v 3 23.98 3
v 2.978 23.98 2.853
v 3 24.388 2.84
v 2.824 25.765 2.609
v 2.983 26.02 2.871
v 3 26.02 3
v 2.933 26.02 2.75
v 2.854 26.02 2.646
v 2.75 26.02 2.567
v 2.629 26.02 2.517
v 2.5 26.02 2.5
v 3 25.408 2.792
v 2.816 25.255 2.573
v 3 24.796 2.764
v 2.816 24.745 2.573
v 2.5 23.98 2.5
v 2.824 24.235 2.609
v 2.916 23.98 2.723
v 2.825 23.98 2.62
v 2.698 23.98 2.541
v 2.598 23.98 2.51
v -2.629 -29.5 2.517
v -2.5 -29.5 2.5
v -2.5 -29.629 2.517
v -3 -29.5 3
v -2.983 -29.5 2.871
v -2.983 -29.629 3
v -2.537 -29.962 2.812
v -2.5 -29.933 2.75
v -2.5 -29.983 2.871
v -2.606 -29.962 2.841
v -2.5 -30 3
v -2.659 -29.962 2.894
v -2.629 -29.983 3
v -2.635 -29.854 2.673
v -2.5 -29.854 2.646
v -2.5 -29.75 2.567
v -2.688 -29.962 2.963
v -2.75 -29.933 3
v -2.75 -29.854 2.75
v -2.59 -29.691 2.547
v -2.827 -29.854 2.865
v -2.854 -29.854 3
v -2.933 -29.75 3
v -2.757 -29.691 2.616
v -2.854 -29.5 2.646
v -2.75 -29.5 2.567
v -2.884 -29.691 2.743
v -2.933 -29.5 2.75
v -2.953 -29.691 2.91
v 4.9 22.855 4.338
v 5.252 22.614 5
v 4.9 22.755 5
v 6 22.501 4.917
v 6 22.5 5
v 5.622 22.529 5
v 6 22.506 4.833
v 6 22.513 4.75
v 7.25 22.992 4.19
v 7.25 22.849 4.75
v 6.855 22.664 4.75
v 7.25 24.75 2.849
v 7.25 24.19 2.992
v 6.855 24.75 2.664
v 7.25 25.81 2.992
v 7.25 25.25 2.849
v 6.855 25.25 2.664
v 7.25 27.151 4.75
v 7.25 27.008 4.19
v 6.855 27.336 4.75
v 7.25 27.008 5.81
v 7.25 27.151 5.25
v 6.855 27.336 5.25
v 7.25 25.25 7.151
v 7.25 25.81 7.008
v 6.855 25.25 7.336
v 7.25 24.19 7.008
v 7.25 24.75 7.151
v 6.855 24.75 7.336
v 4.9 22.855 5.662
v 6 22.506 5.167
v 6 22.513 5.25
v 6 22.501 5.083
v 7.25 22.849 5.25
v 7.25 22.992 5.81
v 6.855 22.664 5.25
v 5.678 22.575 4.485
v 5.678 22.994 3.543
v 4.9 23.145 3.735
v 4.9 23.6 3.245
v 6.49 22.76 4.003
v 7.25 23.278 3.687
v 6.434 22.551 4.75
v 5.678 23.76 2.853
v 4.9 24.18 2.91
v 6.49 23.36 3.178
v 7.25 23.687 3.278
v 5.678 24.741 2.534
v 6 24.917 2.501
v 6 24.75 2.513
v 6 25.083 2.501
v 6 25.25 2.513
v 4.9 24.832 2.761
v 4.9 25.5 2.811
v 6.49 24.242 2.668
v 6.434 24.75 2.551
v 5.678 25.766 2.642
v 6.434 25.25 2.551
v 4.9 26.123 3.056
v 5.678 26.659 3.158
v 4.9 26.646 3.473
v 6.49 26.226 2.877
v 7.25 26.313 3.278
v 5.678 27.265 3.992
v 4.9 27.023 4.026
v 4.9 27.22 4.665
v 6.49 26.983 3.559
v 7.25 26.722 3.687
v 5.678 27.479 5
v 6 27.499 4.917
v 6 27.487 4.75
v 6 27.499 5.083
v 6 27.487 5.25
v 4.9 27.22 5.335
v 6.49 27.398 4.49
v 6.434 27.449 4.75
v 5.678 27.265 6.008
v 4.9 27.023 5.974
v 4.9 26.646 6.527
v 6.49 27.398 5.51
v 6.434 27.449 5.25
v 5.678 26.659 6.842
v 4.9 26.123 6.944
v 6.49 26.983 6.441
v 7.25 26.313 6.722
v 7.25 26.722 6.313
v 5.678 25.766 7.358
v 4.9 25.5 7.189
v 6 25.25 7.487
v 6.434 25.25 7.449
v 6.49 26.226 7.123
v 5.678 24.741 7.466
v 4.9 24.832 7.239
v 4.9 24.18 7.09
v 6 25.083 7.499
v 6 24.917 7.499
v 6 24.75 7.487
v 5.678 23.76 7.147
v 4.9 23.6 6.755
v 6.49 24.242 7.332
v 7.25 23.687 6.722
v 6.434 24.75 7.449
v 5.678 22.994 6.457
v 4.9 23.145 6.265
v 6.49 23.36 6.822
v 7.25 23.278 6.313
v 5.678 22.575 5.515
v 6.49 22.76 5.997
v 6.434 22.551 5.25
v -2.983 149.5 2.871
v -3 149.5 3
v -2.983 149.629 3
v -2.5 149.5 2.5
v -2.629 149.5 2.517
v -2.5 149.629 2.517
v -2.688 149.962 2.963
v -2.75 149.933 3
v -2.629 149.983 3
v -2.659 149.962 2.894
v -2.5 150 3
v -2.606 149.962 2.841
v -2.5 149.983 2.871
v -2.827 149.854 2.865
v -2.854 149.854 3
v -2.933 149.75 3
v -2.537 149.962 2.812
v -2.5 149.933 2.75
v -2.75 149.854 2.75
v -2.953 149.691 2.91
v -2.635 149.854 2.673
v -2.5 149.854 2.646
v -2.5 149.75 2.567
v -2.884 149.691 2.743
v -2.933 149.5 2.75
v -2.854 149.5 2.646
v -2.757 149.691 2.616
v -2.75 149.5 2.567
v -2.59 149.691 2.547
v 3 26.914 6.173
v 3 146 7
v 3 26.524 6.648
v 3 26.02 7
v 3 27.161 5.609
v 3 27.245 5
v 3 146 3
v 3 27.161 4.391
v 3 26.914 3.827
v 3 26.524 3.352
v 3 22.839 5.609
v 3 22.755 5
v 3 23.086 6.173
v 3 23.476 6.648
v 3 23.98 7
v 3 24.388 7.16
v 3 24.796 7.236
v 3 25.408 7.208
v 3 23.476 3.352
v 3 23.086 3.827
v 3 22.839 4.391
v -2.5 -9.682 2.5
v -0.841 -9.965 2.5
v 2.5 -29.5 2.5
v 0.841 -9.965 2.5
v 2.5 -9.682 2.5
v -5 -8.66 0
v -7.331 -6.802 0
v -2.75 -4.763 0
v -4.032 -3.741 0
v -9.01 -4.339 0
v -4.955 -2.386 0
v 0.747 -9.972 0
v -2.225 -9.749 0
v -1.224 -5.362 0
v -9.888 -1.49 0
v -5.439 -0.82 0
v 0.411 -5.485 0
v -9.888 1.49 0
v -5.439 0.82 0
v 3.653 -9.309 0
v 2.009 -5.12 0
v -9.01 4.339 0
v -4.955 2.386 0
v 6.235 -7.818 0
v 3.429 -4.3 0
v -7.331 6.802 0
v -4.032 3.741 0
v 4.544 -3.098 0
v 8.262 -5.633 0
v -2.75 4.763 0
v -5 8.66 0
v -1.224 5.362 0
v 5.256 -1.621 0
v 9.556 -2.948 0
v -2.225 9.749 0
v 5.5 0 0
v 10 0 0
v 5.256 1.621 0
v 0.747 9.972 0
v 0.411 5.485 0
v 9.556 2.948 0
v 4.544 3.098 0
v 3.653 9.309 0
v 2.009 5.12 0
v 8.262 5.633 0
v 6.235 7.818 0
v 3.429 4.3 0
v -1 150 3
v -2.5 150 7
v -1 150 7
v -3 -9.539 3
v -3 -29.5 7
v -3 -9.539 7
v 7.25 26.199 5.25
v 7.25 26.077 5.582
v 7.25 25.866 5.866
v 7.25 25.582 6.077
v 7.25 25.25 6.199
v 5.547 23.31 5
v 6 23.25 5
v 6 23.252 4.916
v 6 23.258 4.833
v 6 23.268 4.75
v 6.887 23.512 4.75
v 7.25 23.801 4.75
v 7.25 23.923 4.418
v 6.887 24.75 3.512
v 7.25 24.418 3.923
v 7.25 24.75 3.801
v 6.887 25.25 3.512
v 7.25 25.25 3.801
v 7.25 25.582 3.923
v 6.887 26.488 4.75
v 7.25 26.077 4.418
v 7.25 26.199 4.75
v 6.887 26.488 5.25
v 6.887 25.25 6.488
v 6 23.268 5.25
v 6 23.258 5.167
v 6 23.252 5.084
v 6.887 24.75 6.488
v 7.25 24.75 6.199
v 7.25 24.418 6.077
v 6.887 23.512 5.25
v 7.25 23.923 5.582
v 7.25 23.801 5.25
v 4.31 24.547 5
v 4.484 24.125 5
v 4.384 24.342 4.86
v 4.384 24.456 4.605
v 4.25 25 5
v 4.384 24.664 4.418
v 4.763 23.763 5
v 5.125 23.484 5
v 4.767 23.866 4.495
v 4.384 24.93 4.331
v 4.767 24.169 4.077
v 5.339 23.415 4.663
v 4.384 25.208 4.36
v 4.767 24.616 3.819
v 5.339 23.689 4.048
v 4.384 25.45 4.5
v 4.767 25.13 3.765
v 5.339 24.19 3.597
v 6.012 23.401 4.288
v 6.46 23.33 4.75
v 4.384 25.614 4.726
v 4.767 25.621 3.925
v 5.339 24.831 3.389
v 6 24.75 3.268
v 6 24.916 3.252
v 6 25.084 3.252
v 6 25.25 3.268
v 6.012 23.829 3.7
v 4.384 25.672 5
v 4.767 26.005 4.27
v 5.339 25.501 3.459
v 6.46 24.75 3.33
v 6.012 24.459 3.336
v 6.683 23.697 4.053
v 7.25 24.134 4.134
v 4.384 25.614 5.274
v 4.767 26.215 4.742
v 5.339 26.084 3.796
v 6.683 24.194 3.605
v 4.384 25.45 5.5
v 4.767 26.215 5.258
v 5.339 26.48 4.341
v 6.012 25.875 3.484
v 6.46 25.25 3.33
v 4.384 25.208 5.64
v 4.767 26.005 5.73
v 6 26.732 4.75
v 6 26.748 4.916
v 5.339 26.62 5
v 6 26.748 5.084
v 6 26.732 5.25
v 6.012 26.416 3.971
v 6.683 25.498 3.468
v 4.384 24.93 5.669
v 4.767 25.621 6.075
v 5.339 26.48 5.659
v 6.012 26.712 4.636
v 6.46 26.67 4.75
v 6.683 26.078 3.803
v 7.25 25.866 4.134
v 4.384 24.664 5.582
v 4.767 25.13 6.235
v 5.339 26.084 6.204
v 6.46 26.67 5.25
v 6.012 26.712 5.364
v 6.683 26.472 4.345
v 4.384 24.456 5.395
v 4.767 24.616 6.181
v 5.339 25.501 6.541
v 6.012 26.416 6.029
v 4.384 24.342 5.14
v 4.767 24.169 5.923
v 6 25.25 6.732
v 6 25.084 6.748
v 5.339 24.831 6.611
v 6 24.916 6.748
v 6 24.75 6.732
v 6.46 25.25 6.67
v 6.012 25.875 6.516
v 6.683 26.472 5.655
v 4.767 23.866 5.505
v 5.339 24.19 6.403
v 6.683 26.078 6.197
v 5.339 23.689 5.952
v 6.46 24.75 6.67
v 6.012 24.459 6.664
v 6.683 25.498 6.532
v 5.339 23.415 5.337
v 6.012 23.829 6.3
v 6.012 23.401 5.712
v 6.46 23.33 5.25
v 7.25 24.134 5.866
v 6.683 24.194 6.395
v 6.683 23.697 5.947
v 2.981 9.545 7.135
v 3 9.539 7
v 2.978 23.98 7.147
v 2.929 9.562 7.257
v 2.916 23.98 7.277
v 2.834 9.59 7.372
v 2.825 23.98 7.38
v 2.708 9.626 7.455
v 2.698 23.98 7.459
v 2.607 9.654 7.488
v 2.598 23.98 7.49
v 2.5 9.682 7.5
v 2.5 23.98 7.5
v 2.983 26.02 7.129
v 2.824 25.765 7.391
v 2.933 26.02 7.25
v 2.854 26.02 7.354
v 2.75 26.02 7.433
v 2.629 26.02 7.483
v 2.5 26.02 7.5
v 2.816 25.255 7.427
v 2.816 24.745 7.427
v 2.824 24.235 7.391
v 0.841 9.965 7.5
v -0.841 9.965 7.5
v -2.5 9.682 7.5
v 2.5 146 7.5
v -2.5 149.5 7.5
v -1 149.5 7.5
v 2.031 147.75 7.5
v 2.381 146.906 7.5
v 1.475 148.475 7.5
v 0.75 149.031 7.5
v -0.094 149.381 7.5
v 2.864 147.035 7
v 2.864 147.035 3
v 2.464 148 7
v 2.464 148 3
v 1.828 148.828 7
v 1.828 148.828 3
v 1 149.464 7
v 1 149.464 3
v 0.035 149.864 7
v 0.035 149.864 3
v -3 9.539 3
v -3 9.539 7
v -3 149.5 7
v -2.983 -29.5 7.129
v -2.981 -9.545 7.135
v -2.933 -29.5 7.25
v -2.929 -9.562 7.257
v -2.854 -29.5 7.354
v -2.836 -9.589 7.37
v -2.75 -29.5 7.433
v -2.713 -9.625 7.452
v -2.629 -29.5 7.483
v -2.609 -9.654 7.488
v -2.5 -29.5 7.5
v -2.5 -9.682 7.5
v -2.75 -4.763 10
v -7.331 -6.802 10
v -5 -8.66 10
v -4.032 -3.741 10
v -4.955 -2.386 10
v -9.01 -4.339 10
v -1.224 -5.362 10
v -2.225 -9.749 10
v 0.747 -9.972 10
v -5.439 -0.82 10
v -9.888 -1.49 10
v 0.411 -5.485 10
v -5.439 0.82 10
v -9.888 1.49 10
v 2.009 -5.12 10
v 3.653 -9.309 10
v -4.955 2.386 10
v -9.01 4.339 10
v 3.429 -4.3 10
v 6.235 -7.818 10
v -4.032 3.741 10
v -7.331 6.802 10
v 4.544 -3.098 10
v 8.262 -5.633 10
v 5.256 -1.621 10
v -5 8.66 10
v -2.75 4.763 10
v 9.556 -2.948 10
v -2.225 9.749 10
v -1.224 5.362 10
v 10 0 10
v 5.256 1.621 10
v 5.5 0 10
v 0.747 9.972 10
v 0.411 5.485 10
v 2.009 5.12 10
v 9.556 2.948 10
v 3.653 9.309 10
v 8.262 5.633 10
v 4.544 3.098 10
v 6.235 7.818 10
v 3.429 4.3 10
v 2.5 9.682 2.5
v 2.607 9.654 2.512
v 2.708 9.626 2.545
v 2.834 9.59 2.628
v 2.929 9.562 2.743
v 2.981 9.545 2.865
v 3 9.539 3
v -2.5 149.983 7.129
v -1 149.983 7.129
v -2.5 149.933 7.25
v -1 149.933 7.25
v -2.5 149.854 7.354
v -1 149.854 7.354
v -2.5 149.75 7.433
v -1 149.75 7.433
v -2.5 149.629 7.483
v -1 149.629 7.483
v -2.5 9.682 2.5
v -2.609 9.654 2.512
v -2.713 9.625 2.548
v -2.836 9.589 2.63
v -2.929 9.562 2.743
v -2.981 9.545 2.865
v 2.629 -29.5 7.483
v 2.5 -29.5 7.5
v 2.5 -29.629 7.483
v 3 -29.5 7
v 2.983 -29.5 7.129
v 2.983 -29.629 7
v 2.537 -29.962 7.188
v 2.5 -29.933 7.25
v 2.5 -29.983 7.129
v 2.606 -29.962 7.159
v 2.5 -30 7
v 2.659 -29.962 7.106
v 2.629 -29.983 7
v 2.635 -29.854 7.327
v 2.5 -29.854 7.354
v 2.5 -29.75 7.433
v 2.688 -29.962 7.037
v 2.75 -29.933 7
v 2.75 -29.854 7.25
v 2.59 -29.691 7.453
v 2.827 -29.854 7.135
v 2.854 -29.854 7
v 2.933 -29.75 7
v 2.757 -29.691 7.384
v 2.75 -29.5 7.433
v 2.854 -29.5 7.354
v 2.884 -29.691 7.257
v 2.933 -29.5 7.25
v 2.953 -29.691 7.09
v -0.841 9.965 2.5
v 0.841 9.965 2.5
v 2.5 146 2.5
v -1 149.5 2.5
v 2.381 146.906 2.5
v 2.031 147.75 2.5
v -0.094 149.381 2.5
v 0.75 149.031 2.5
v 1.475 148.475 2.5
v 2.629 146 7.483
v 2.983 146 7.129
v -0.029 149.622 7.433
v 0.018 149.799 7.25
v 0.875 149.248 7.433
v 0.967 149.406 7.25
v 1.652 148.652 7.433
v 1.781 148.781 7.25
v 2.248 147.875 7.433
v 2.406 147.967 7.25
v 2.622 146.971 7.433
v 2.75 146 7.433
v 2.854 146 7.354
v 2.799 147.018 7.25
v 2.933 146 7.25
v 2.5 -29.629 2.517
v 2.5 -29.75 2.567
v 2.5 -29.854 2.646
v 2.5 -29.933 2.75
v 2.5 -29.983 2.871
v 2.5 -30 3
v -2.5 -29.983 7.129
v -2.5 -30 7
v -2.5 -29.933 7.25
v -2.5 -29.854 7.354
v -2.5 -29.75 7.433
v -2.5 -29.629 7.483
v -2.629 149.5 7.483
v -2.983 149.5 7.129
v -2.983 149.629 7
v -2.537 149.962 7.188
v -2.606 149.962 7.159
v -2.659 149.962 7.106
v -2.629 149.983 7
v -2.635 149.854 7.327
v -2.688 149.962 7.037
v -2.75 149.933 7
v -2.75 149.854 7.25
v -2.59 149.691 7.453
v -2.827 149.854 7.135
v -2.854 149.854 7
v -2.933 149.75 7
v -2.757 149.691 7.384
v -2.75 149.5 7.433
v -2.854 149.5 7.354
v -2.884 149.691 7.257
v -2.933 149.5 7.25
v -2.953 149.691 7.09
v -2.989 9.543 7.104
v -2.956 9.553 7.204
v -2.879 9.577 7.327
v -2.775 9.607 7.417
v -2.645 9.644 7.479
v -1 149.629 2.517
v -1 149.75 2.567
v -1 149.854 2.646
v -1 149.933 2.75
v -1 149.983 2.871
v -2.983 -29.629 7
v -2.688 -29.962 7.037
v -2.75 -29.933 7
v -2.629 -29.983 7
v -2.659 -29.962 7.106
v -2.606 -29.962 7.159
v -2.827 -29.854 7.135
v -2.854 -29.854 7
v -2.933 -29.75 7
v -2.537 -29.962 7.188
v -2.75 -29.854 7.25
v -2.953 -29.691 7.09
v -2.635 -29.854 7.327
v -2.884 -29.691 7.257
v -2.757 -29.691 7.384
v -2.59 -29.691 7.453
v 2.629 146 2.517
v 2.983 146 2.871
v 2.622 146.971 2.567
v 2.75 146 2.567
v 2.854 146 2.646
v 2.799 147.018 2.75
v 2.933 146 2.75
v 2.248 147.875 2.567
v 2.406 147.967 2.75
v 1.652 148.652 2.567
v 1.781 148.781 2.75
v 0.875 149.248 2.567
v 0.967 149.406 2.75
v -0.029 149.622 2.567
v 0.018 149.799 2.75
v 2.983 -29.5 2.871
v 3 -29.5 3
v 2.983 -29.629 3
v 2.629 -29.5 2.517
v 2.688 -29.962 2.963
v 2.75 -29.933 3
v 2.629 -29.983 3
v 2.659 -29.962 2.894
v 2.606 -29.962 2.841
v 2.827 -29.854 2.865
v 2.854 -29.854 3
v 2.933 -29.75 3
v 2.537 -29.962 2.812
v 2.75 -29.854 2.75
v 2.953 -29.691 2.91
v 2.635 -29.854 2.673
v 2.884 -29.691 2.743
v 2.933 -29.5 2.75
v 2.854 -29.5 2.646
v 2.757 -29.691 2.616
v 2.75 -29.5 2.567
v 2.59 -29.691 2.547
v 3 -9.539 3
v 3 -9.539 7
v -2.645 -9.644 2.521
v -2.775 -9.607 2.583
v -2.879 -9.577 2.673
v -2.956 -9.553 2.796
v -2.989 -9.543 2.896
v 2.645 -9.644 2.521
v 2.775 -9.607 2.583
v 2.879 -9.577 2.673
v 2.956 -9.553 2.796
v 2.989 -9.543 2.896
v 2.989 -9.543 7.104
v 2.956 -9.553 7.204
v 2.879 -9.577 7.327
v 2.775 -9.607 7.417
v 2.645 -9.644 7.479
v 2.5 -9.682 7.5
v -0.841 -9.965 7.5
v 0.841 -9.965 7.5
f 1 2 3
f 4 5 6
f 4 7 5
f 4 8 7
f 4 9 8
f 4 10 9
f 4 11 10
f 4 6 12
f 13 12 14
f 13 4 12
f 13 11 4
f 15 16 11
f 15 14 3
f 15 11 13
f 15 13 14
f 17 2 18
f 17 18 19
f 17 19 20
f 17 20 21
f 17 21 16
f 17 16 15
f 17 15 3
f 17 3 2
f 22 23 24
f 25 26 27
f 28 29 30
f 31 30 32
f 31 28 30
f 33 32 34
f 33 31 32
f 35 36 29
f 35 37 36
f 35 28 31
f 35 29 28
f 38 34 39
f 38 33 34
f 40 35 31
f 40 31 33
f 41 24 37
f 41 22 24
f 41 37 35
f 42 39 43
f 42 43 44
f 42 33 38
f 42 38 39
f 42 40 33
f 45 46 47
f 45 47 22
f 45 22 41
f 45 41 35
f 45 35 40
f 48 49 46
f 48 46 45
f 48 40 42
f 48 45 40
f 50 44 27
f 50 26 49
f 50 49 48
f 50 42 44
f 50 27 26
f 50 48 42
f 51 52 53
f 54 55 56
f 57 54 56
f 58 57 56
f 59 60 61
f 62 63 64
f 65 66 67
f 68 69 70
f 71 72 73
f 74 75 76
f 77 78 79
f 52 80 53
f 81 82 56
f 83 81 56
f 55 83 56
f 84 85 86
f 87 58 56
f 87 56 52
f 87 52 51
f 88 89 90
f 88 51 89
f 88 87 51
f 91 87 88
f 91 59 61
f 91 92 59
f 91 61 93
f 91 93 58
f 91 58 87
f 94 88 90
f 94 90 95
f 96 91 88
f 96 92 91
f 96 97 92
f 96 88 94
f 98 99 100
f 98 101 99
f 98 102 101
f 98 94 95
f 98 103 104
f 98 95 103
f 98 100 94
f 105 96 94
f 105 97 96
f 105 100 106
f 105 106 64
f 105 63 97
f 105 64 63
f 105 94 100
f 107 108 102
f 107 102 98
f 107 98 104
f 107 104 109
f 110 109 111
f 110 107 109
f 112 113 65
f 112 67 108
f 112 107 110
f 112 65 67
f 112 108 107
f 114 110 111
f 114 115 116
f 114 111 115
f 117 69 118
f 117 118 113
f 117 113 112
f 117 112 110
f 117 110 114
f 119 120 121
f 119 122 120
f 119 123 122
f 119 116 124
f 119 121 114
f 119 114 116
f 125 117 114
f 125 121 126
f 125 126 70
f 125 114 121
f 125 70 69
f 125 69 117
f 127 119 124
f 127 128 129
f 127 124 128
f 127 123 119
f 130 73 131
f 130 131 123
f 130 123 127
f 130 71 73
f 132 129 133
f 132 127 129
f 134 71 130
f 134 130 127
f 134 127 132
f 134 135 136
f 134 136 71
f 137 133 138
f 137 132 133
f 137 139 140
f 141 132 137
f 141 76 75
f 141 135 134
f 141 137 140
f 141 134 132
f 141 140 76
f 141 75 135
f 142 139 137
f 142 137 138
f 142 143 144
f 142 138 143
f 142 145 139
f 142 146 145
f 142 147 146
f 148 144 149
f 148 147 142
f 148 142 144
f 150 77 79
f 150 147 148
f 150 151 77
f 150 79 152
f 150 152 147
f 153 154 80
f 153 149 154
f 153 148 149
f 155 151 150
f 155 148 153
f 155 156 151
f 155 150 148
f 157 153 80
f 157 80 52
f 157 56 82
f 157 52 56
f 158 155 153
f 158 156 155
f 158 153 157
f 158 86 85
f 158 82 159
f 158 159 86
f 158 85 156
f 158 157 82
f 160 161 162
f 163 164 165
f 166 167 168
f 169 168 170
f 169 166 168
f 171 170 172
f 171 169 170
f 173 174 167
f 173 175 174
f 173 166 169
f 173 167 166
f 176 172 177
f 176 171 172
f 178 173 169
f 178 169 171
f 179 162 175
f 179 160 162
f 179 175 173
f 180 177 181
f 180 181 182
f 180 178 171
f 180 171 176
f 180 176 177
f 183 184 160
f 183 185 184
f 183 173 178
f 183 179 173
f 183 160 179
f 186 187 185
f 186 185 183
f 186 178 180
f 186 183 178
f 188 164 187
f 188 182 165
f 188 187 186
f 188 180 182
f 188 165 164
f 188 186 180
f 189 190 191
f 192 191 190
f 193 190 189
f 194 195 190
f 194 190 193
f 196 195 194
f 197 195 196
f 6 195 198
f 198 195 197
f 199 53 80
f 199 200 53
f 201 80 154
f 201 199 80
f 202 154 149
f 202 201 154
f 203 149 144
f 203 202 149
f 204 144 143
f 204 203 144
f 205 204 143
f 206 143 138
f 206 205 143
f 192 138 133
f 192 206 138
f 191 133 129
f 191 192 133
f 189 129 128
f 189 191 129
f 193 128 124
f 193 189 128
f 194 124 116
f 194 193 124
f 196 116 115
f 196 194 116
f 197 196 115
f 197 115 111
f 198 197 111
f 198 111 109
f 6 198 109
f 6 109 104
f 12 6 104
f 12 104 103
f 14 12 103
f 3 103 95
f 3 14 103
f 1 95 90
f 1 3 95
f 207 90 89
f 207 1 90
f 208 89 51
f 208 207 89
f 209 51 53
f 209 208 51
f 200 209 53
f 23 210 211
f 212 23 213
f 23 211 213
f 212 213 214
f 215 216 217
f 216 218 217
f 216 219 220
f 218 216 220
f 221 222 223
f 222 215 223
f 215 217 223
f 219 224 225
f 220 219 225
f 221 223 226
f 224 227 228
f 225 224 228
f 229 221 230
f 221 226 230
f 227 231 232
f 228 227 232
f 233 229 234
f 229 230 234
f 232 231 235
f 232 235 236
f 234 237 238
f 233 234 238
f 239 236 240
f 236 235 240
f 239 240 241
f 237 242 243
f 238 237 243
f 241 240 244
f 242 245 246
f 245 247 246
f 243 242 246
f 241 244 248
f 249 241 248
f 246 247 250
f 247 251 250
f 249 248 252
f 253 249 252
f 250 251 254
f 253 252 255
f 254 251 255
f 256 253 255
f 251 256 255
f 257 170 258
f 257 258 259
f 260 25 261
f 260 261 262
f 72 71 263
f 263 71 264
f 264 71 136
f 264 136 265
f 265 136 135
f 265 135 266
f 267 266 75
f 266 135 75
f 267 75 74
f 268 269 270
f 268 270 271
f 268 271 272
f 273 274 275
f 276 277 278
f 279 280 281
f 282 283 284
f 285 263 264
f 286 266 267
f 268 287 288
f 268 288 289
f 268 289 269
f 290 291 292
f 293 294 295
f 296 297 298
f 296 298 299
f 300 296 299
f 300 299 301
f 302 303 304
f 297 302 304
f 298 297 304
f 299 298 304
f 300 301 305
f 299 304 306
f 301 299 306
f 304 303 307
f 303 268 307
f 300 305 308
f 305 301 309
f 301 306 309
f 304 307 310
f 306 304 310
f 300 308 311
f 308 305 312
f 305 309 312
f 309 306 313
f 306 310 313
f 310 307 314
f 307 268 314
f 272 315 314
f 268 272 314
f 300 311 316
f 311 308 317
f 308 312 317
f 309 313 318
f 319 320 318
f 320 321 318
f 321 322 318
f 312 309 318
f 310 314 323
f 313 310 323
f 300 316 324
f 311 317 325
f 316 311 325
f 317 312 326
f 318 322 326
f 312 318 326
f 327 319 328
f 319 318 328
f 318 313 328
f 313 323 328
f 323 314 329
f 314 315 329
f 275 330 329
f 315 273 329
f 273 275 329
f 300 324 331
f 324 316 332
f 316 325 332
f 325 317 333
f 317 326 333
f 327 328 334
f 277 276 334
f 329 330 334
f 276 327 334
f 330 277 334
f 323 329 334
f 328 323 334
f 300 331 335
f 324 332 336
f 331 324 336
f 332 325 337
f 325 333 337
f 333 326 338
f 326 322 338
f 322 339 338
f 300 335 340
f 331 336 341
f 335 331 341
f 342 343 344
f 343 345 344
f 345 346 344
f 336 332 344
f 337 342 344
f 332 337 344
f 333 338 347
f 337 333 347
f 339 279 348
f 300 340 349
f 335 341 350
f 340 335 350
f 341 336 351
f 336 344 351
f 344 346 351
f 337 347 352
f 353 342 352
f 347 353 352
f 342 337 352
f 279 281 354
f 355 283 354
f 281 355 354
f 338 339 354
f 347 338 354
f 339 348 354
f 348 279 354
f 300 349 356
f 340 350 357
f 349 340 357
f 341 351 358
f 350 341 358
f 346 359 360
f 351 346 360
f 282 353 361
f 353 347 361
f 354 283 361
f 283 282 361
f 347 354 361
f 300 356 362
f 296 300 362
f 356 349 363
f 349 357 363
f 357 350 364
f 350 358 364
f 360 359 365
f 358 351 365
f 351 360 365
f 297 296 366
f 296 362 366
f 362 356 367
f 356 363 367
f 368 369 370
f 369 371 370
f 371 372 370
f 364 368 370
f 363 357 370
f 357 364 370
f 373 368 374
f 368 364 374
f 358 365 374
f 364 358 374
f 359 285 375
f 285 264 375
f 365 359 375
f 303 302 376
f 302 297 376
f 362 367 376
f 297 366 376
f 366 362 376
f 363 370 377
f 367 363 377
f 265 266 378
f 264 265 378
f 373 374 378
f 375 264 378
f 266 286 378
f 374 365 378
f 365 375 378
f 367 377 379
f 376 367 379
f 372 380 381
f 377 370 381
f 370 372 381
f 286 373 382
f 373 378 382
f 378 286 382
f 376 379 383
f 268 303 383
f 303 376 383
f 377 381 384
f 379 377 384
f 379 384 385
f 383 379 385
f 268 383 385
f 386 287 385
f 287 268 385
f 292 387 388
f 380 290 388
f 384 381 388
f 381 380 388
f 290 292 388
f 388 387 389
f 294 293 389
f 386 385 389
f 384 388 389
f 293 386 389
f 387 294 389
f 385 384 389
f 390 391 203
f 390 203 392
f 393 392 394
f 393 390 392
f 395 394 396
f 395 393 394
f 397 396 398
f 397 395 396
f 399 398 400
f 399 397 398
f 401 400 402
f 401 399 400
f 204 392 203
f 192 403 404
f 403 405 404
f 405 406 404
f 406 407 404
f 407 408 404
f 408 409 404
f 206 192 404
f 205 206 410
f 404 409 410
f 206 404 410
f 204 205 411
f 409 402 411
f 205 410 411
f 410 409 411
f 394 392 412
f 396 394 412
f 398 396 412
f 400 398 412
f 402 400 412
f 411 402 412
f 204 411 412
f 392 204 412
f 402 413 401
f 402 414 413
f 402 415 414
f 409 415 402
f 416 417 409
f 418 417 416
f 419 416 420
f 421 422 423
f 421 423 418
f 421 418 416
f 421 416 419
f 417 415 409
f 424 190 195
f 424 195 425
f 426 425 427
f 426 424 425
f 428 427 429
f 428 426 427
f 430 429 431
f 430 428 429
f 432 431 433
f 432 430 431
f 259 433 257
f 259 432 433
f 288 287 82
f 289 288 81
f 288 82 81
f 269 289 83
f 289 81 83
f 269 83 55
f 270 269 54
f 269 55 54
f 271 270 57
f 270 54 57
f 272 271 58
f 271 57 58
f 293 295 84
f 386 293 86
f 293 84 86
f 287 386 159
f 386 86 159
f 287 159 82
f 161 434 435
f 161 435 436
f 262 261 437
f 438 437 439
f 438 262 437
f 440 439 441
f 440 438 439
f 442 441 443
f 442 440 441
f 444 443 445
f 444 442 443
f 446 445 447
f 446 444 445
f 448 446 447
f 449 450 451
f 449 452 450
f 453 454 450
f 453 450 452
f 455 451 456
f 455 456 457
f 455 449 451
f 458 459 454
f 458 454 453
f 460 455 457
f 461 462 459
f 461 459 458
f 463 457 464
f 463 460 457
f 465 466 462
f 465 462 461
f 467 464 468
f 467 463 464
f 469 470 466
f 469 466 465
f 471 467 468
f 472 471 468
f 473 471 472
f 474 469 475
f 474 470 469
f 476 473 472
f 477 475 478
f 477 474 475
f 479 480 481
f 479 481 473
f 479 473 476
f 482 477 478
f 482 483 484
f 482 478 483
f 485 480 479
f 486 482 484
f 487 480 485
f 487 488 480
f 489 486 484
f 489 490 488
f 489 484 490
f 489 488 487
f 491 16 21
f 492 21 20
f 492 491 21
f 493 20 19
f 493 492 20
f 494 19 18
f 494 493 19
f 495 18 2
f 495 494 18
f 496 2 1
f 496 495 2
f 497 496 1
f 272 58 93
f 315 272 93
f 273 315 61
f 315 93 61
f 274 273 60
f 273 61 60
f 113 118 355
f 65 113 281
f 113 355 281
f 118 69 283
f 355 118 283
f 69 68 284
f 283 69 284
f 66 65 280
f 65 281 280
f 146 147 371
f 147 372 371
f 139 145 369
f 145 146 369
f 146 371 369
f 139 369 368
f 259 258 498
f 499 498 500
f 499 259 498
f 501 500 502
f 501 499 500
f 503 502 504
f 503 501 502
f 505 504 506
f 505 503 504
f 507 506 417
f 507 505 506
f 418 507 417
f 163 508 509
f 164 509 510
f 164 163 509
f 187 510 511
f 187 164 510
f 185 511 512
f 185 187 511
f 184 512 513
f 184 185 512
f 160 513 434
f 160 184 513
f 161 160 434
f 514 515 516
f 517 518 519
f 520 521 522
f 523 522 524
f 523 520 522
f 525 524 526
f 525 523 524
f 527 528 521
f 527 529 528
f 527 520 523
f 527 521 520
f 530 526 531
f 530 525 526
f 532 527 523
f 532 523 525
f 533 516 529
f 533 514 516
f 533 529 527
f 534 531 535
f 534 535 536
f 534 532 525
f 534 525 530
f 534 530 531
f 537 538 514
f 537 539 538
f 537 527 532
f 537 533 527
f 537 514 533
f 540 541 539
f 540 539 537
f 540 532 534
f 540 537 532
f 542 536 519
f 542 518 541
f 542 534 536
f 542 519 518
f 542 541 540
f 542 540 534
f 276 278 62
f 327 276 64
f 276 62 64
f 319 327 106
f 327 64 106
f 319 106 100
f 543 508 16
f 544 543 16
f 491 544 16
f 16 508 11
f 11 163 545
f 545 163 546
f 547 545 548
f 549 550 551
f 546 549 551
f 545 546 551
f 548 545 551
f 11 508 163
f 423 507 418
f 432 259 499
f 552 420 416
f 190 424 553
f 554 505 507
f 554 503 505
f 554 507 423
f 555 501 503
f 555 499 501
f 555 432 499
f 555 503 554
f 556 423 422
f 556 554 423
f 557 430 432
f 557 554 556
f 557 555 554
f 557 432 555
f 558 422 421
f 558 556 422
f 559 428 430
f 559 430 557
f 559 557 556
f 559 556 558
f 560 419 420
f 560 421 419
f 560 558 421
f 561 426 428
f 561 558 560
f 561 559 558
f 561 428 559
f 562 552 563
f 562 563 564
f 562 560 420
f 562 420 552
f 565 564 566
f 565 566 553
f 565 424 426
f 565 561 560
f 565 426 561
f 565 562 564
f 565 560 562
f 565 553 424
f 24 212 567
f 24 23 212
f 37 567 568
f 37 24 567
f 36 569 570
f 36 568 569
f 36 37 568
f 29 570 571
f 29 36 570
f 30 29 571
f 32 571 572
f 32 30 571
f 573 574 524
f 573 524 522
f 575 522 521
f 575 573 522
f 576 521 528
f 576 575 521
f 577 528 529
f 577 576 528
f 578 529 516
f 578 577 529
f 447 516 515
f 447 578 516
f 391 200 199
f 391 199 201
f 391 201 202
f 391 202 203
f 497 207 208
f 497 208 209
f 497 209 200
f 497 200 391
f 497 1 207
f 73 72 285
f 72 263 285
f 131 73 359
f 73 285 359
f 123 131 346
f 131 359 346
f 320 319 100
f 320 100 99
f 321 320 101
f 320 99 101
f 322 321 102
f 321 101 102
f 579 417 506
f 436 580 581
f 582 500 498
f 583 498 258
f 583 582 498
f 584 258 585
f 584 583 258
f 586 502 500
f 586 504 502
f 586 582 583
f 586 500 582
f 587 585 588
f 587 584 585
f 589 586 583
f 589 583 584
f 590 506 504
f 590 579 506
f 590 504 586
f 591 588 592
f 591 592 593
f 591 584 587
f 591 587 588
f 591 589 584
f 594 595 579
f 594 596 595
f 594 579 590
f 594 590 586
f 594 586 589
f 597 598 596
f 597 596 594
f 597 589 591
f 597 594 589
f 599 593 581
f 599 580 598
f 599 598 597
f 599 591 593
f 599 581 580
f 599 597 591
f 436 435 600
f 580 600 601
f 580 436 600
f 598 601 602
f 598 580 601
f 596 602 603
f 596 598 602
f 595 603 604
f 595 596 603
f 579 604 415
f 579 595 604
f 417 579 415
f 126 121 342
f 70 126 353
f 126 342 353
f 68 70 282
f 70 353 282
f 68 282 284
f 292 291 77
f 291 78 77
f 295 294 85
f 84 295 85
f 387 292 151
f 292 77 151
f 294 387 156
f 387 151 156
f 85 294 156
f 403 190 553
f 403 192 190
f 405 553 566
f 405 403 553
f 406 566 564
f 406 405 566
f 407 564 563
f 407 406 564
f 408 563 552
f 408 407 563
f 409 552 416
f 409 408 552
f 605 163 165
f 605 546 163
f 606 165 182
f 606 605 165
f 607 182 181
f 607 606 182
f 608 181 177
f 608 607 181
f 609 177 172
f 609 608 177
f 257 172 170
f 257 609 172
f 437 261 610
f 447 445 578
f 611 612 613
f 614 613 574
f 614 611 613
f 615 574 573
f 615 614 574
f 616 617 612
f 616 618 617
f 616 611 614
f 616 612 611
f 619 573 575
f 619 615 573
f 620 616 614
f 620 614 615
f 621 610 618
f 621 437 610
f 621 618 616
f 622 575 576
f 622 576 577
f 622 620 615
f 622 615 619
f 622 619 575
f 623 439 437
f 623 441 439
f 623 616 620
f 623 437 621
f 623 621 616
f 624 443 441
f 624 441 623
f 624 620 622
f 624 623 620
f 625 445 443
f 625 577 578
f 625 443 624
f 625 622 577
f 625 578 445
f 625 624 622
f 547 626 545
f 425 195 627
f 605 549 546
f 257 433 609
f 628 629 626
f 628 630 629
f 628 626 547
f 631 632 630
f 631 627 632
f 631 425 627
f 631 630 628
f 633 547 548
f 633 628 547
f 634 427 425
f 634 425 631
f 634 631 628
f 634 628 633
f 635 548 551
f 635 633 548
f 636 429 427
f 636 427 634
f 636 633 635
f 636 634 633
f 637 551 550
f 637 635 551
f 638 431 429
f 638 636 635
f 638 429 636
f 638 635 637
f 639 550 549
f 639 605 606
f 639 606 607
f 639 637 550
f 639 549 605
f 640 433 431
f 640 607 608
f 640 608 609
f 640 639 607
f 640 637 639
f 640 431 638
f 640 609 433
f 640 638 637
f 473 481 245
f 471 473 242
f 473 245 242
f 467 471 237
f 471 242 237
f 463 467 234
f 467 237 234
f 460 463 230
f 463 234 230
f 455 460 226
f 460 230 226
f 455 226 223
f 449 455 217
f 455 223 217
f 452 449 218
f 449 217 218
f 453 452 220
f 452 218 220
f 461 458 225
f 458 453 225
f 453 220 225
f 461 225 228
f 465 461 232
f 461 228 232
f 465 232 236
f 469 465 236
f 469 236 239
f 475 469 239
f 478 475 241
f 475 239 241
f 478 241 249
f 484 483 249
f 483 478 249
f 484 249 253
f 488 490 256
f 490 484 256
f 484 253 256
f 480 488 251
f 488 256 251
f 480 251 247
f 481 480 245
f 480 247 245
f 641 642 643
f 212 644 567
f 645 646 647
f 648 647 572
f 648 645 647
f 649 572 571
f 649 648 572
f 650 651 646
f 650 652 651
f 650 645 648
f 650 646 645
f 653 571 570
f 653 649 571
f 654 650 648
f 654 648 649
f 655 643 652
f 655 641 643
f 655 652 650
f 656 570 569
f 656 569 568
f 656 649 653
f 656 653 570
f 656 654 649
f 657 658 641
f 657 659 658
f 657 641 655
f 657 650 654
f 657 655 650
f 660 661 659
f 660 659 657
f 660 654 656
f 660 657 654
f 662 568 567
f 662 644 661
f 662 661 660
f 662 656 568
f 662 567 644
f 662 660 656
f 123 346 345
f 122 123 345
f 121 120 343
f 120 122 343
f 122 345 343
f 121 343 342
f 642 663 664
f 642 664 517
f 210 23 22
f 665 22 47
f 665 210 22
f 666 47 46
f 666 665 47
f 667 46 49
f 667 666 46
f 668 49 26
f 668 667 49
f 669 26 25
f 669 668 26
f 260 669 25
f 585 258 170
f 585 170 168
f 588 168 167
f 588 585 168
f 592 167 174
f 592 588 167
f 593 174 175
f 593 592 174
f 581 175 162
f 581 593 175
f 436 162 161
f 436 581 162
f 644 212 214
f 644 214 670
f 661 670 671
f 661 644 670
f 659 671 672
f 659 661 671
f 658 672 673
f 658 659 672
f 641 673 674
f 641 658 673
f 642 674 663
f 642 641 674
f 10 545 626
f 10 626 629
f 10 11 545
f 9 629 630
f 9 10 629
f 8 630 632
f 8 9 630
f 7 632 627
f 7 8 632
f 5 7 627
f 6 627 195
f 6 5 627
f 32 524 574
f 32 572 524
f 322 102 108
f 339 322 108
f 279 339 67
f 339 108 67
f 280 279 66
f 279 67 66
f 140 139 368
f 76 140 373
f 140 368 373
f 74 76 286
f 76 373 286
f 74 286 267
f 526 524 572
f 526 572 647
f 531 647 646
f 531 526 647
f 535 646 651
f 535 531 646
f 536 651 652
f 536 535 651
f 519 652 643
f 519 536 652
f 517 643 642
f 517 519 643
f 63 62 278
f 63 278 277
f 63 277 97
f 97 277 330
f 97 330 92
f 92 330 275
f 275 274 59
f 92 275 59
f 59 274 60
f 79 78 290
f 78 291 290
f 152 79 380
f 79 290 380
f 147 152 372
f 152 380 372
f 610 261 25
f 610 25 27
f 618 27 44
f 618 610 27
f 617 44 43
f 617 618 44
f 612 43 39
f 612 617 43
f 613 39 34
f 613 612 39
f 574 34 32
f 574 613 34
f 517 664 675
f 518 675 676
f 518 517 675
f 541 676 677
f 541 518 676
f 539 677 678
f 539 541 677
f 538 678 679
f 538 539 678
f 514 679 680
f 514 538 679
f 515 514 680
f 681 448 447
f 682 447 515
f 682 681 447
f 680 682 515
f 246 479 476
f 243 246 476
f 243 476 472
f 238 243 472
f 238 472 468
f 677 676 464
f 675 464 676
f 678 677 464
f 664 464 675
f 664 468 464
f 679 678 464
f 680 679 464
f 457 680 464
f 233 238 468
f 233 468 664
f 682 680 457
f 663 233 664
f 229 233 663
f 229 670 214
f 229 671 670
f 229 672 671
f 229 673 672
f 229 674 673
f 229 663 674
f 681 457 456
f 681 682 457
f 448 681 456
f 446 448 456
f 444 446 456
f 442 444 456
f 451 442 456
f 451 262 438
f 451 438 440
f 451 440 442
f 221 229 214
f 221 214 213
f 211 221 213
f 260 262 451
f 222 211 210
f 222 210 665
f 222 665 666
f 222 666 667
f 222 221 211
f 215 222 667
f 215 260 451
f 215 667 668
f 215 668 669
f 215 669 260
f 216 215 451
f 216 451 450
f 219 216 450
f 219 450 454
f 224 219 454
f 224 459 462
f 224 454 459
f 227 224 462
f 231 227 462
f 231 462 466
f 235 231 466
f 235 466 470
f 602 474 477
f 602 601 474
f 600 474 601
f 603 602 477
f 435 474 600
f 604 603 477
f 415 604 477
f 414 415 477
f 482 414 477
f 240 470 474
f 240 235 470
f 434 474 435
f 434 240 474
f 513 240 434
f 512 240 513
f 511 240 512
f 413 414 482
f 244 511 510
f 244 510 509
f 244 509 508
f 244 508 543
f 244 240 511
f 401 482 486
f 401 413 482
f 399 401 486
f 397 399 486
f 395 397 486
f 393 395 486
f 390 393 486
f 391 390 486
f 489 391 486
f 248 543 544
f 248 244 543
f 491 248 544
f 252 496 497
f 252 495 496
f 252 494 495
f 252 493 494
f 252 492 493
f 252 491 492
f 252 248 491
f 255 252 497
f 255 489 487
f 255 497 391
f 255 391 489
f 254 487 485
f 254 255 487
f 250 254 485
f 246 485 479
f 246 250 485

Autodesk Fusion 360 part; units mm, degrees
sketch "Szkic1" plane through (0, 0, 0) normal (0, 0, 1) x (1, 0, 0)
  circle A0 centre (0, 0) radius 5.5
  line L0 (-3, 150) -> (3, 150)
  line L1 (3, 150) -> (3, -30)
  line L2 (3, -30) -> (-3, -30)
  line L3 (-3, -30) -> (-3, 150)
  line L4 (0, 1.75) -> (0, 22.5)
  circle A1 centre (0, 0) radius 10
  dimension "d7" = 11
  dimension "d8" = 30
  dimension "d10" = 6
  dimension "d11" = 180
  dimension "d12" = 20
extrude "Wyciągnięcie proste1" add sketch "Szkic1" along normal blind 10 contours A0 L1 A1 | A0 L1 L4 A1 | A0 L1 L3 A1 | A0 L3 L4 A1 | A0 L3 A1
extrude "Wyciągnięcie proste2" add sketch "Szkic1" along normal blind 5 from surface at 2.5 contours L0 L1 L3 A1 | L1 L2 L3 A1
ref_plane "Płaszczyzna konstrukcyjna1" through (0, -19.7697, 5) normal (0, 0, 1) x (1, 0, 0)
sketch "Szkic2" plane through (0, 0, 5) normal (0, 0, 1) x (1, 0, 0)
  circle A0 centre (6, 25) radius 2.5
  line L0 (4.9, 22.755) -> (3, 22.755)
  line L1 (3, 22.755) -> (3, 27.245)
  line L2 (3, 27.245) -> (4.9, 27.245)
  line L3 (4.9, 27.245) -> (4.9, 22.755)
  line L4 (3, 150) -> (3, -30)
  line L5 (6, 25) -> (3, 25)
  line L6 (7.25, 22.8349) -> (7.25, 27.1651)
  circle A1 centre (6, 25) radius 1.75
  line L7 (7.7321, 24.75) -> (6, 24.75)
  line L8 (6, 24.75) -> (6, 25.25)
  line L9 (6, 25.25) -> (7.7321, 25.25)
  line L10 (7.7321, 25.25) -> (7.7321, 24.75)
  line L11 (-3, 150) -> (3, 150)
  dimension "d18" = 5
  dimension "d19" = 1.25
  dimension "d20" = 3.5
  dimension "d21" = 0.5
  dimension "d22" = 25
  dimension "d23" = 125
  dimension "d24" = 1.1
  dimension "d25" = 3
revolve "Obrót1" add sketch "Szkic2" angle 360 about axis through (6, 25, 5) along (-1, 0, 0) contours A0 L3 L6 A1 | A0 L0 L1 L4 L5 | A0 L3 L5 A1 picked at (5.1557, 22.9188) picked at (4.6078, 23.2377)
extrude "Wyciągnięcie proste3" cut sketch "Szkic2" along normal through all and the other way through all contours L6 L7 L8 L9
pattern_circular "Szyk kołowy1" count 2 over 90 about axis through (6, 25, 5) along (-1, 0, 0) of "Wyciągnięcie proste3"
fillet "Zaokrąglenie1" radius 0.5 15 edges at (3, 79.7697, 7.5) (-3, 79.7697, 7.5) (3, 79.7697, 2.5) (-3, 79.7697, 2.5) (3, -19.7697, 7.5) (-3, -19.7697, 7.5) (3, -19.7697, 2.5) (-3, -19.7697, 2.5) (-3, -30, 5) (0, -30, 7.5) (3, -30, 5) (0, -30, 2.5) (0, 150, 7.5) (-3, 150, 5) (0, 150, 2.5)
fillet "Zaokrąglenie1" radius 4 1 edges at (3, 150, 5)
